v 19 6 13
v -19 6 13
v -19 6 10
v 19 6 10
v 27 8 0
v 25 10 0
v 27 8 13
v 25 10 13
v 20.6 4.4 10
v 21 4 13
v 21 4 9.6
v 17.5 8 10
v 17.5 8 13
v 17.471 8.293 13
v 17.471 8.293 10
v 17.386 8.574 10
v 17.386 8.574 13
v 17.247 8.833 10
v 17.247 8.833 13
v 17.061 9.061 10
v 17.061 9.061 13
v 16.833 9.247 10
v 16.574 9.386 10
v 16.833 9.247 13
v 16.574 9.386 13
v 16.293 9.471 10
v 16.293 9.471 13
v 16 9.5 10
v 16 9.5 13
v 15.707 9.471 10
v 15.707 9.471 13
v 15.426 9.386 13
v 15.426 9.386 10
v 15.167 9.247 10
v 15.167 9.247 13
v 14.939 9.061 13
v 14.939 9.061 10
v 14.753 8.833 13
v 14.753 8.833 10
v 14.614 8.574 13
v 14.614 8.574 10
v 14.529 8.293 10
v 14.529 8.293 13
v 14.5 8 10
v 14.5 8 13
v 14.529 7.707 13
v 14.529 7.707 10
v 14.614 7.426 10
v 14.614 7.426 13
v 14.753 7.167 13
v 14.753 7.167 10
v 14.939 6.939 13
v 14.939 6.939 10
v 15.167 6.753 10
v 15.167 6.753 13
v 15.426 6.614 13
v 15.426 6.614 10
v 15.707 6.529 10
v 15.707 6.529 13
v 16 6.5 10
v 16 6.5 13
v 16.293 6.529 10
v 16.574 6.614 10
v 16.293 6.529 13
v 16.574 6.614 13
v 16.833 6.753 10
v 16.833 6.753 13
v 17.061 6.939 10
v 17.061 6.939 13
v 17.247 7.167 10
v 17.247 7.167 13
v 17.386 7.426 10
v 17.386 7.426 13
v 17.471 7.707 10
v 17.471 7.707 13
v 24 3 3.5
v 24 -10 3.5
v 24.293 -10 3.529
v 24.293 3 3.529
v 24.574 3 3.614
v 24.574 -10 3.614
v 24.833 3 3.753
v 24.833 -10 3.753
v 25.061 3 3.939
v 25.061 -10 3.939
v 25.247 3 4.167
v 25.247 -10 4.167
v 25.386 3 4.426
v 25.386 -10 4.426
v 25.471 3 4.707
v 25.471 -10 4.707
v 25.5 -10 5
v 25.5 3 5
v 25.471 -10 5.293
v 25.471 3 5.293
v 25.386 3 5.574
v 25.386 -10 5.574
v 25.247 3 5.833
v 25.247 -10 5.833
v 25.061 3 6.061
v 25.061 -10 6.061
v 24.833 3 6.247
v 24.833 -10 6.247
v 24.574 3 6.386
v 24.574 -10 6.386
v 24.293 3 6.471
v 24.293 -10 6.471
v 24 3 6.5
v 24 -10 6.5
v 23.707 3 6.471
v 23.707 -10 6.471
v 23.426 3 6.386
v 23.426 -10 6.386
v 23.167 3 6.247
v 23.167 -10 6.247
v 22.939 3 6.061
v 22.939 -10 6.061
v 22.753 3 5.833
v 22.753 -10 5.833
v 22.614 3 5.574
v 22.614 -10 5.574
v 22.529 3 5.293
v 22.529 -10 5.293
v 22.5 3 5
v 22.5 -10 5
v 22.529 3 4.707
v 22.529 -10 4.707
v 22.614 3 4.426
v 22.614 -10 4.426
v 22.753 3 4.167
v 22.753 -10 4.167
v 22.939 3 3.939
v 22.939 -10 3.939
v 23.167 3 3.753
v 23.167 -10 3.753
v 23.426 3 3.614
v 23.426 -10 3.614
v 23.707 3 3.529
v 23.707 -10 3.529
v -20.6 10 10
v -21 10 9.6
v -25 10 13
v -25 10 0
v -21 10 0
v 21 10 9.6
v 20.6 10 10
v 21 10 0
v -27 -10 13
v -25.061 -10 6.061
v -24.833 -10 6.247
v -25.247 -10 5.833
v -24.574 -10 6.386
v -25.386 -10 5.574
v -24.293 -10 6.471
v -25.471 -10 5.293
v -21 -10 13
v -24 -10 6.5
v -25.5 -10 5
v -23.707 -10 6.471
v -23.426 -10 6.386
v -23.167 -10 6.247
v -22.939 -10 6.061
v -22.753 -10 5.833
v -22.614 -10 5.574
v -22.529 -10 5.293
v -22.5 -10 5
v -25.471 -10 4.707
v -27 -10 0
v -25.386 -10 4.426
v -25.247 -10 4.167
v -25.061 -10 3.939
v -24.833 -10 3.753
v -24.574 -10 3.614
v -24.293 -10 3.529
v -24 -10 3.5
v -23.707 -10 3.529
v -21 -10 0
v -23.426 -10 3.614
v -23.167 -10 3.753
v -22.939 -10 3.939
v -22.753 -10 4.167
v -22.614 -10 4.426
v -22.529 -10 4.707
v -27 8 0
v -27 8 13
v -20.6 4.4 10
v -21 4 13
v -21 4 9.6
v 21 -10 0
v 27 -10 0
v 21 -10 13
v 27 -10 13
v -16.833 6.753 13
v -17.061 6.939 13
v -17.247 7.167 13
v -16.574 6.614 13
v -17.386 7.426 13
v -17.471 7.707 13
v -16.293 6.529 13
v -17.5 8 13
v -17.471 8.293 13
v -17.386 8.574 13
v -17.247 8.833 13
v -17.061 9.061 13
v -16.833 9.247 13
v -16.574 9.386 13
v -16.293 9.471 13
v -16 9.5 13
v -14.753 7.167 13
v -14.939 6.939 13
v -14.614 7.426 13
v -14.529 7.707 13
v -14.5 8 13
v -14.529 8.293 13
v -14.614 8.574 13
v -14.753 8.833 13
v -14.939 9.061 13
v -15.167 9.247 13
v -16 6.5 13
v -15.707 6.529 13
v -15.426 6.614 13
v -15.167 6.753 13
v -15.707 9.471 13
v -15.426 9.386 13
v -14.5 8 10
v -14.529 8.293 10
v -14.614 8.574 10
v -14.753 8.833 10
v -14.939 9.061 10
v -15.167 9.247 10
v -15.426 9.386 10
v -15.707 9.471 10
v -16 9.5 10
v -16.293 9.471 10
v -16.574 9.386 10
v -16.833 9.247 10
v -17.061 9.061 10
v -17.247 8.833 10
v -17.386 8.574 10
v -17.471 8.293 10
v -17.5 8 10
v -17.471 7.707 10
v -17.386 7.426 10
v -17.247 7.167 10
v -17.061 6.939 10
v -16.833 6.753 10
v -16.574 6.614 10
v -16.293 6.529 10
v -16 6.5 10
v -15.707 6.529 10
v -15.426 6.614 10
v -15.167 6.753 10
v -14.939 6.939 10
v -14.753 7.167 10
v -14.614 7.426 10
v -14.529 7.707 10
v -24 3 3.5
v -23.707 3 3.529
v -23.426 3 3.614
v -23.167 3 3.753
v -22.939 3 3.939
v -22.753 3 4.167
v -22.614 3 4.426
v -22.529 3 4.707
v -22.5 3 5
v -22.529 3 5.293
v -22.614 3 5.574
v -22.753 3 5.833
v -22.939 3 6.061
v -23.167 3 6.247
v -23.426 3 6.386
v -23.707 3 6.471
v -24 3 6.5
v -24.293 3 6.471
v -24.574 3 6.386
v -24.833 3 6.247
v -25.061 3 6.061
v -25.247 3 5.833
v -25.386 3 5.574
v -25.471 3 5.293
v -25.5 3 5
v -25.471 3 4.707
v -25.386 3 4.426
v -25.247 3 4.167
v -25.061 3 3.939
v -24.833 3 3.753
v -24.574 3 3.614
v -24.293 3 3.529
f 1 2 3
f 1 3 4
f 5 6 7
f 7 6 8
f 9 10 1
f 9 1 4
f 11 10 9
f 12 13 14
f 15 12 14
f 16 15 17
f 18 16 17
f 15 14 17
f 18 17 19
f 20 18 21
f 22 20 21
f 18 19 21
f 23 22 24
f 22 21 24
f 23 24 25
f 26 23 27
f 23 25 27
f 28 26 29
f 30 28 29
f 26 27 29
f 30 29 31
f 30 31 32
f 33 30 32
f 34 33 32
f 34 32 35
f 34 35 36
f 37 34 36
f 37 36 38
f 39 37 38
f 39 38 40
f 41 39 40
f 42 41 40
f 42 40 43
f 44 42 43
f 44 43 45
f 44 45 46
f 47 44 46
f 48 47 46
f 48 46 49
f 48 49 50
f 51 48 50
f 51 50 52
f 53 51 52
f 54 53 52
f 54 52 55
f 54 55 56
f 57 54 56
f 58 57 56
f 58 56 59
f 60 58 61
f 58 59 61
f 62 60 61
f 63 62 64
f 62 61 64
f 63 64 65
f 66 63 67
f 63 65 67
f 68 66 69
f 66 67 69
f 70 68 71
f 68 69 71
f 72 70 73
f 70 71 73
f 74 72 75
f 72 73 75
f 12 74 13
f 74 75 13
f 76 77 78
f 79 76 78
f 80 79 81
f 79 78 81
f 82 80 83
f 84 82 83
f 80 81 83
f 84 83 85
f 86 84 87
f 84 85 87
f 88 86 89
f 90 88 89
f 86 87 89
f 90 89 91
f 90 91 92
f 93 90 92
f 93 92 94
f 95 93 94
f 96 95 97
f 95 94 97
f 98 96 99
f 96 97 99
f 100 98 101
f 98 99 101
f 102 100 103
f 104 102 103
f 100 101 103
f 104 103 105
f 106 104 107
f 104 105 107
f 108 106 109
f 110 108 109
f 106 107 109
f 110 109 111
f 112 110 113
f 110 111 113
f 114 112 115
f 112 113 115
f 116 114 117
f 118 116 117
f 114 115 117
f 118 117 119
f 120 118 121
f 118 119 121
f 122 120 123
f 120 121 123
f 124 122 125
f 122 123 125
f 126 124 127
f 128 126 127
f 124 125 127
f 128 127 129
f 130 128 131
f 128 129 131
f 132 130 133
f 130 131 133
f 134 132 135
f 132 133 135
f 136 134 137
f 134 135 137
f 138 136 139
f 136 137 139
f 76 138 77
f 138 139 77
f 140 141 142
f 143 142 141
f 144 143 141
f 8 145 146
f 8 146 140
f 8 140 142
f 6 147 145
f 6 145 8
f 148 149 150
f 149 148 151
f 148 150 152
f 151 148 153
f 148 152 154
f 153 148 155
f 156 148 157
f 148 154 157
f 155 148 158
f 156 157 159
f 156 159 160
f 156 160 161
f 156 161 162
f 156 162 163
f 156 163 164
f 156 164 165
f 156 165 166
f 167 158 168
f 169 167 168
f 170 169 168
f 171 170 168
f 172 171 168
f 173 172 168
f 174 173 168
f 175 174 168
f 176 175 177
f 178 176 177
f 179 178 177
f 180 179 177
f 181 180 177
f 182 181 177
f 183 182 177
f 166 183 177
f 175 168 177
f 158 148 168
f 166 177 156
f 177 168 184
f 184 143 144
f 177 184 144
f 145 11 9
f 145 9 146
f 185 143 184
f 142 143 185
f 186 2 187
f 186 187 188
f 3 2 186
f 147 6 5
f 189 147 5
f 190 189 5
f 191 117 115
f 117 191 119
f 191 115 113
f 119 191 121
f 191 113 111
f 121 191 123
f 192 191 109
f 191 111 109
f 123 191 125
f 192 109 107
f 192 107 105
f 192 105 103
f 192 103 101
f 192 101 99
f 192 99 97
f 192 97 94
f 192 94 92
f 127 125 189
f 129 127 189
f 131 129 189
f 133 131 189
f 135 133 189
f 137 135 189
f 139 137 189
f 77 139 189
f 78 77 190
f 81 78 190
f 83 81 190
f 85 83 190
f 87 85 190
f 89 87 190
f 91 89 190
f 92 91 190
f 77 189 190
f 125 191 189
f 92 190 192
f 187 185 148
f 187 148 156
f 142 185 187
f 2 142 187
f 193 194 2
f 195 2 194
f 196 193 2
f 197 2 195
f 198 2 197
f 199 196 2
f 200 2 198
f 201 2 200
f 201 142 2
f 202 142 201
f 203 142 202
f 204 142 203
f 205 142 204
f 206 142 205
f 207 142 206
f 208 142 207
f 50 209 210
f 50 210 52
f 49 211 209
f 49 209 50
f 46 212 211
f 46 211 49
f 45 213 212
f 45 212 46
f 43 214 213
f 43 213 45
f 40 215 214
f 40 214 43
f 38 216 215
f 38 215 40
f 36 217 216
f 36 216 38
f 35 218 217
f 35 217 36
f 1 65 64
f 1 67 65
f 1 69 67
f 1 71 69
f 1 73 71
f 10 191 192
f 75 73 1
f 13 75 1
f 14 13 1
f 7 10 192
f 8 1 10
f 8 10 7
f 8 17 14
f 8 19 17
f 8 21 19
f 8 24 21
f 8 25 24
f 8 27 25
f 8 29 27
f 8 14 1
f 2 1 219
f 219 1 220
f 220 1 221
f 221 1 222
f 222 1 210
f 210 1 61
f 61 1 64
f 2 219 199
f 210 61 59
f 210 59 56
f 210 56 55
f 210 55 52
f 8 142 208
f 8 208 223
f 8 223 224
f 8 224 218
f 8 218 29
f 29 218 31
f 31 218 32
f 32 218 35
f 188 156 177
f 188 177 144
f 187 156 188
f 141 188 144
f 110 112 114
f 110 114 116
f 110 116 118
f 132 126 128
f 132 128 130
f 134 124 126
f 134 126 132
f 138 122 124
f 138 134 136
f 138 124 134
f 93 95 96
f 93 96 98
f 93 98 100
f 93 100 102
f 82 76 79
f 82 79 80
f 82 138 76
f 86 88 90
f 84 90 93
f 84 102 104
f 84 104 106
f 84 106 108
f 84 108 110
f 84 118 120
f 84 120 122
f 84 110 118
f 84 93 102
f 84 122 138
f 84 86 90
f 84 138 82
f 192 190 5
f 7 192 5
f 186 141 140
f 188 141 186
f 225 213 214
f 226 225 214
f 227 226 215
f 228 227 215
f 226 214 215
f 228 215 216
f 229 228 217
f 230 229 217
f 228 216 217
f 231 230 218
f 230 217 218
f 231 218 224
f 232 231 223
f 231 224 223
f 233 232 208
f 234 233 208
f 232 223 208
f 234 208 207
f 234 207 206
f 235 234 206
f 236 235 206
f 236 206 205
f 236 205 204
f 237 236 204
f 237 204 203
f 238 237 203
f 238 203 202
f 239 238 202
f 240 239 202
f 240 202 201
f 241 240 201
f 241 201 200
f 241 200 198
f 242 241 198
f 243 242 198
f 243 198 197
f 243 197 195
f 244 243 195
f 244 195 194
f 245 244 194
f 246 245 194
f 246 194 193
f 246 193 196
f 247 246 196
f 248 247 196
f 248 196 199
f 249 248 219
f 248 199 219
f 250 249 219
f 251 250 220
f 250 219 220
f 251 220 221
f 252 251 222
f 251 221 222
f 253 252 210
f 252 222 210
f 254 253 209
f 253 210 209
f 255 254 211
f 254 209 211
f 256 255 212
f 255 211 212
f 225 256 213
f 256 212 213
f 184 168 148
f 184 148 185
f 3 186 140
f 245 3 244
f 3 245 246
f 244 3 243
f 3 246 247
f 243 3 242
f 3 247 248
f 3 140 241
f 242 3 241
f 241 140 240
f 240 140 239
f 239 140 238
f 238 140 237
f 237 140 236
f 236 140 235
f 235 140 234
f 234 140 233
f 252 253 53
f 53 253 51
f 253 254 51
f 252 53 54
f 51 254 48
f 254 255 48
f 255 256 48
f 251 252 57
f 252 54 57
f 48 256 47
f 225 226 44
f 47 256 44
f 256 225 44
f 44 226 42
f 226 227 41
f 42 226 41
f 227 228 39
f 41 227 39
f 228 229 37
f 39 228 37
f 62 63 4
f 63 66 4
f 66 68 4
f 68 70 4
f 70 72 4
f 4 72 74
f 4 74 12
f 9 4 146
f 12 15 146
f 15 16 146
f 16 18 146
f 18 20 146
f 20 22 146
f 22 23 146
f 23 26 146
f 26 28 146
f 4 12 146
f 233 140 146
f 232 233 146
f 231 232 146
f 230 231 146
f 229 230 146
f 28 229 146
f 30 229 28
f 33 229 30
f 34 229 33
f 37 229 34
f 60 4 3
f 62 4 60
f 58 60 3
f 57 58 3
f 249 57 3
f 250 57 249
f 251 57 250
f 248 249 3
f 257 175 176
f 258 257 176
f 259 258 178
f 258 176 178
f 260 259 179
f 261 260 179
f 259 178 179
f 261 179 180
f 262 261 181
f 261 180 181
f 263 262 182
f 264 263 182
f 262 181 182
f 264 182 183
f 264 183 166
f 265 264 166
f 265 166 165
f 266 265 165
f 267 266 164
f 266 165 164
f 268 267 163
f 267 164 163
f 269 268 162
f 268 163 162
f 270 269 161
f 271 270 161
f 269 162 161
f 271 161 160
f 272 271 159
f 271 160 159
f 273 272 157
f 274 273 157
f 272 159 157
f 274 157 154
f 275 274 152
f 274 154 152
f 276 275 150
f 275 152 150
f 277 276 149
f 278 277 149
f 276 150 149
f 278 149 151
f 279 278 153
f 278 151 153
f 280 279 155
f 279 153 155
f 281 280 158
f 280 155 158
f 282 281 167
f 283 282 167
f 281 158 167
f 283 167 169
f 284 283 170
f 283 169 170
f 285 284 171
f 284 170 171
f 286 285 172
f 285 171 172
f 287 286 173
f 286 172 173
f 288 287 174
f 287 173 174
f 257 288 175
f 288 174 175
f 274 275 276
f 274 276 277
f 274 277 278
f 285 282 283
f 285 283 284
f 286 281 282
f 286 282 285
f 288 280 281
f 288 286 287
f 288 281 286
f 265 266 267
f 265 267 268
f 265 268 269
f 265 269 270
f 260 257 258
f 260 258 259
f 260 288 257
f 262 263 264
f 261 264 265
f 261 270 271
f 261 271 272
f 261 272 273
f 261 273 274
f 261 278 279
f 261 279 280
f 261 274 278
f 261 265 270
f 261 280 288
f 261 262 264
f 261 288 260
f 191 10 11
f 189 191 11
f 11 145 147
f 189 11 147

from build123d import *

# Parameters (mm, degrees)
SKETCH_1_W          = 54
SKETCH_1_H          = 20
EXTRUDE_1_DEPTH     = 13
SKETCH_2_W          = 42
SKETCH_2_H          = 16
CUT_EXTRUDE_1_DEPTH = 32.591137998
SKETCH_3_R          = 1.5
CUT_EXTRUDE_2_DEPTH = 32.591137998
SKETCH_4_R          = 1.5
CUT_EXTRUDE_3_DEPTH = 13
SKETCH_5_W          = 42
SKETCH_5_H          = 10
CUT_EXTRUDE_4_DEPTH = 37.027767069
CHAMFER_1_SIZE      = 2
CHAMFER_2_SIZE      = 2
CHAMFER_3_SIZE      = 0.4


with BuildPart() as part:
    # 草圖1 → 填料-伸長1 (new body)
    with BuildSketch(Plane.XY):
        Rectangle(SKETCH_1_W, SKETCH_1_H)
    extrude(amount=EXTRUDE_1_DEPTH)

    # 草圖2 → 除料-伸長1 (cut, through all)
    with BuildSketch(Plane.XY.offset(13)):
        with Locations((0, -2)):
            Rectangle(SKETCH_2_W, SKETCH_2_H)
    extrude(amount=-CUT_EXTRUDE_1_DEPTH, mode=Mode.SUBTRACT)

    # 草圖3 → 除料-伸長2 (cut, through all)
    with BuildSketch(Plane.XY.offset(13)):
        with Locations((-16, 8)):
            Circle(SKETCH_3_R)
        with Locations((16, 8)):
            Circle(SKETCH_3_R)
    extrude(amount=-CUT_EXTRUDE_2_DEPTH, mode=Mode.SUBTRACT)

    # 草圖4 → 除料-伸長3 (cut)
    with BuildSketch(Plane.XZ.offset(10)):
        with Locations(Location((-24, 5, 0), (0, 0, 270))):
            Circle(SKETCH_4_R)
        with Locations(Location((24, 5, 0), (0, 0, 270))):
            Circle(SKETCH_4_R)
    extrude(amount=-CUT_EXTRUDE_3_DEPTH, mode=Mode.SUBTRACT)

    # 草圖5 → 除料-伸長4 (cut, through all)
    with BuildSketch(Plane(origin=(0, 10, 0), x_dir=(1, 0, 0), z_dir=(0, 1, 0))):
        with Locations((0, -5)):
            Rectangle(SKETCH_5_W, SKETCH_5_H)
    extrude(amount=-CUT_EXTRUDE_4_DEPTH, mode=Mode.SUBTRACT)

    # 導角1
    chamfer_1_edges = [part.edges().sort_by_distance(p)[0] for p in [
        (-27, 10, 6.5),
        (27, 10, 6.5),
    ]]
    chamfer(chamfer_1_edges, length=CHAMFER_1_SIZE)

    # 導角2
    chamfer_2_edges = [part.edges().sort_by_distance(p)[0] for p in [
        (21, 6, 11.5),
        (-21, 6, 11.5),
    ]]
    chamfer(chamfer_2_edges, length=CHAMFER_2_SIZE)

    # 導角3
    chamfer_3_edges = [part.edges().sort_by_distance(p)[0] for p in [
        (-21, 7, 10),
        (21, 7, 10),
    ]]
    chamfer(chamfer_3_edges, length=CHAMFER_3_SIZE)


solid = part.part
